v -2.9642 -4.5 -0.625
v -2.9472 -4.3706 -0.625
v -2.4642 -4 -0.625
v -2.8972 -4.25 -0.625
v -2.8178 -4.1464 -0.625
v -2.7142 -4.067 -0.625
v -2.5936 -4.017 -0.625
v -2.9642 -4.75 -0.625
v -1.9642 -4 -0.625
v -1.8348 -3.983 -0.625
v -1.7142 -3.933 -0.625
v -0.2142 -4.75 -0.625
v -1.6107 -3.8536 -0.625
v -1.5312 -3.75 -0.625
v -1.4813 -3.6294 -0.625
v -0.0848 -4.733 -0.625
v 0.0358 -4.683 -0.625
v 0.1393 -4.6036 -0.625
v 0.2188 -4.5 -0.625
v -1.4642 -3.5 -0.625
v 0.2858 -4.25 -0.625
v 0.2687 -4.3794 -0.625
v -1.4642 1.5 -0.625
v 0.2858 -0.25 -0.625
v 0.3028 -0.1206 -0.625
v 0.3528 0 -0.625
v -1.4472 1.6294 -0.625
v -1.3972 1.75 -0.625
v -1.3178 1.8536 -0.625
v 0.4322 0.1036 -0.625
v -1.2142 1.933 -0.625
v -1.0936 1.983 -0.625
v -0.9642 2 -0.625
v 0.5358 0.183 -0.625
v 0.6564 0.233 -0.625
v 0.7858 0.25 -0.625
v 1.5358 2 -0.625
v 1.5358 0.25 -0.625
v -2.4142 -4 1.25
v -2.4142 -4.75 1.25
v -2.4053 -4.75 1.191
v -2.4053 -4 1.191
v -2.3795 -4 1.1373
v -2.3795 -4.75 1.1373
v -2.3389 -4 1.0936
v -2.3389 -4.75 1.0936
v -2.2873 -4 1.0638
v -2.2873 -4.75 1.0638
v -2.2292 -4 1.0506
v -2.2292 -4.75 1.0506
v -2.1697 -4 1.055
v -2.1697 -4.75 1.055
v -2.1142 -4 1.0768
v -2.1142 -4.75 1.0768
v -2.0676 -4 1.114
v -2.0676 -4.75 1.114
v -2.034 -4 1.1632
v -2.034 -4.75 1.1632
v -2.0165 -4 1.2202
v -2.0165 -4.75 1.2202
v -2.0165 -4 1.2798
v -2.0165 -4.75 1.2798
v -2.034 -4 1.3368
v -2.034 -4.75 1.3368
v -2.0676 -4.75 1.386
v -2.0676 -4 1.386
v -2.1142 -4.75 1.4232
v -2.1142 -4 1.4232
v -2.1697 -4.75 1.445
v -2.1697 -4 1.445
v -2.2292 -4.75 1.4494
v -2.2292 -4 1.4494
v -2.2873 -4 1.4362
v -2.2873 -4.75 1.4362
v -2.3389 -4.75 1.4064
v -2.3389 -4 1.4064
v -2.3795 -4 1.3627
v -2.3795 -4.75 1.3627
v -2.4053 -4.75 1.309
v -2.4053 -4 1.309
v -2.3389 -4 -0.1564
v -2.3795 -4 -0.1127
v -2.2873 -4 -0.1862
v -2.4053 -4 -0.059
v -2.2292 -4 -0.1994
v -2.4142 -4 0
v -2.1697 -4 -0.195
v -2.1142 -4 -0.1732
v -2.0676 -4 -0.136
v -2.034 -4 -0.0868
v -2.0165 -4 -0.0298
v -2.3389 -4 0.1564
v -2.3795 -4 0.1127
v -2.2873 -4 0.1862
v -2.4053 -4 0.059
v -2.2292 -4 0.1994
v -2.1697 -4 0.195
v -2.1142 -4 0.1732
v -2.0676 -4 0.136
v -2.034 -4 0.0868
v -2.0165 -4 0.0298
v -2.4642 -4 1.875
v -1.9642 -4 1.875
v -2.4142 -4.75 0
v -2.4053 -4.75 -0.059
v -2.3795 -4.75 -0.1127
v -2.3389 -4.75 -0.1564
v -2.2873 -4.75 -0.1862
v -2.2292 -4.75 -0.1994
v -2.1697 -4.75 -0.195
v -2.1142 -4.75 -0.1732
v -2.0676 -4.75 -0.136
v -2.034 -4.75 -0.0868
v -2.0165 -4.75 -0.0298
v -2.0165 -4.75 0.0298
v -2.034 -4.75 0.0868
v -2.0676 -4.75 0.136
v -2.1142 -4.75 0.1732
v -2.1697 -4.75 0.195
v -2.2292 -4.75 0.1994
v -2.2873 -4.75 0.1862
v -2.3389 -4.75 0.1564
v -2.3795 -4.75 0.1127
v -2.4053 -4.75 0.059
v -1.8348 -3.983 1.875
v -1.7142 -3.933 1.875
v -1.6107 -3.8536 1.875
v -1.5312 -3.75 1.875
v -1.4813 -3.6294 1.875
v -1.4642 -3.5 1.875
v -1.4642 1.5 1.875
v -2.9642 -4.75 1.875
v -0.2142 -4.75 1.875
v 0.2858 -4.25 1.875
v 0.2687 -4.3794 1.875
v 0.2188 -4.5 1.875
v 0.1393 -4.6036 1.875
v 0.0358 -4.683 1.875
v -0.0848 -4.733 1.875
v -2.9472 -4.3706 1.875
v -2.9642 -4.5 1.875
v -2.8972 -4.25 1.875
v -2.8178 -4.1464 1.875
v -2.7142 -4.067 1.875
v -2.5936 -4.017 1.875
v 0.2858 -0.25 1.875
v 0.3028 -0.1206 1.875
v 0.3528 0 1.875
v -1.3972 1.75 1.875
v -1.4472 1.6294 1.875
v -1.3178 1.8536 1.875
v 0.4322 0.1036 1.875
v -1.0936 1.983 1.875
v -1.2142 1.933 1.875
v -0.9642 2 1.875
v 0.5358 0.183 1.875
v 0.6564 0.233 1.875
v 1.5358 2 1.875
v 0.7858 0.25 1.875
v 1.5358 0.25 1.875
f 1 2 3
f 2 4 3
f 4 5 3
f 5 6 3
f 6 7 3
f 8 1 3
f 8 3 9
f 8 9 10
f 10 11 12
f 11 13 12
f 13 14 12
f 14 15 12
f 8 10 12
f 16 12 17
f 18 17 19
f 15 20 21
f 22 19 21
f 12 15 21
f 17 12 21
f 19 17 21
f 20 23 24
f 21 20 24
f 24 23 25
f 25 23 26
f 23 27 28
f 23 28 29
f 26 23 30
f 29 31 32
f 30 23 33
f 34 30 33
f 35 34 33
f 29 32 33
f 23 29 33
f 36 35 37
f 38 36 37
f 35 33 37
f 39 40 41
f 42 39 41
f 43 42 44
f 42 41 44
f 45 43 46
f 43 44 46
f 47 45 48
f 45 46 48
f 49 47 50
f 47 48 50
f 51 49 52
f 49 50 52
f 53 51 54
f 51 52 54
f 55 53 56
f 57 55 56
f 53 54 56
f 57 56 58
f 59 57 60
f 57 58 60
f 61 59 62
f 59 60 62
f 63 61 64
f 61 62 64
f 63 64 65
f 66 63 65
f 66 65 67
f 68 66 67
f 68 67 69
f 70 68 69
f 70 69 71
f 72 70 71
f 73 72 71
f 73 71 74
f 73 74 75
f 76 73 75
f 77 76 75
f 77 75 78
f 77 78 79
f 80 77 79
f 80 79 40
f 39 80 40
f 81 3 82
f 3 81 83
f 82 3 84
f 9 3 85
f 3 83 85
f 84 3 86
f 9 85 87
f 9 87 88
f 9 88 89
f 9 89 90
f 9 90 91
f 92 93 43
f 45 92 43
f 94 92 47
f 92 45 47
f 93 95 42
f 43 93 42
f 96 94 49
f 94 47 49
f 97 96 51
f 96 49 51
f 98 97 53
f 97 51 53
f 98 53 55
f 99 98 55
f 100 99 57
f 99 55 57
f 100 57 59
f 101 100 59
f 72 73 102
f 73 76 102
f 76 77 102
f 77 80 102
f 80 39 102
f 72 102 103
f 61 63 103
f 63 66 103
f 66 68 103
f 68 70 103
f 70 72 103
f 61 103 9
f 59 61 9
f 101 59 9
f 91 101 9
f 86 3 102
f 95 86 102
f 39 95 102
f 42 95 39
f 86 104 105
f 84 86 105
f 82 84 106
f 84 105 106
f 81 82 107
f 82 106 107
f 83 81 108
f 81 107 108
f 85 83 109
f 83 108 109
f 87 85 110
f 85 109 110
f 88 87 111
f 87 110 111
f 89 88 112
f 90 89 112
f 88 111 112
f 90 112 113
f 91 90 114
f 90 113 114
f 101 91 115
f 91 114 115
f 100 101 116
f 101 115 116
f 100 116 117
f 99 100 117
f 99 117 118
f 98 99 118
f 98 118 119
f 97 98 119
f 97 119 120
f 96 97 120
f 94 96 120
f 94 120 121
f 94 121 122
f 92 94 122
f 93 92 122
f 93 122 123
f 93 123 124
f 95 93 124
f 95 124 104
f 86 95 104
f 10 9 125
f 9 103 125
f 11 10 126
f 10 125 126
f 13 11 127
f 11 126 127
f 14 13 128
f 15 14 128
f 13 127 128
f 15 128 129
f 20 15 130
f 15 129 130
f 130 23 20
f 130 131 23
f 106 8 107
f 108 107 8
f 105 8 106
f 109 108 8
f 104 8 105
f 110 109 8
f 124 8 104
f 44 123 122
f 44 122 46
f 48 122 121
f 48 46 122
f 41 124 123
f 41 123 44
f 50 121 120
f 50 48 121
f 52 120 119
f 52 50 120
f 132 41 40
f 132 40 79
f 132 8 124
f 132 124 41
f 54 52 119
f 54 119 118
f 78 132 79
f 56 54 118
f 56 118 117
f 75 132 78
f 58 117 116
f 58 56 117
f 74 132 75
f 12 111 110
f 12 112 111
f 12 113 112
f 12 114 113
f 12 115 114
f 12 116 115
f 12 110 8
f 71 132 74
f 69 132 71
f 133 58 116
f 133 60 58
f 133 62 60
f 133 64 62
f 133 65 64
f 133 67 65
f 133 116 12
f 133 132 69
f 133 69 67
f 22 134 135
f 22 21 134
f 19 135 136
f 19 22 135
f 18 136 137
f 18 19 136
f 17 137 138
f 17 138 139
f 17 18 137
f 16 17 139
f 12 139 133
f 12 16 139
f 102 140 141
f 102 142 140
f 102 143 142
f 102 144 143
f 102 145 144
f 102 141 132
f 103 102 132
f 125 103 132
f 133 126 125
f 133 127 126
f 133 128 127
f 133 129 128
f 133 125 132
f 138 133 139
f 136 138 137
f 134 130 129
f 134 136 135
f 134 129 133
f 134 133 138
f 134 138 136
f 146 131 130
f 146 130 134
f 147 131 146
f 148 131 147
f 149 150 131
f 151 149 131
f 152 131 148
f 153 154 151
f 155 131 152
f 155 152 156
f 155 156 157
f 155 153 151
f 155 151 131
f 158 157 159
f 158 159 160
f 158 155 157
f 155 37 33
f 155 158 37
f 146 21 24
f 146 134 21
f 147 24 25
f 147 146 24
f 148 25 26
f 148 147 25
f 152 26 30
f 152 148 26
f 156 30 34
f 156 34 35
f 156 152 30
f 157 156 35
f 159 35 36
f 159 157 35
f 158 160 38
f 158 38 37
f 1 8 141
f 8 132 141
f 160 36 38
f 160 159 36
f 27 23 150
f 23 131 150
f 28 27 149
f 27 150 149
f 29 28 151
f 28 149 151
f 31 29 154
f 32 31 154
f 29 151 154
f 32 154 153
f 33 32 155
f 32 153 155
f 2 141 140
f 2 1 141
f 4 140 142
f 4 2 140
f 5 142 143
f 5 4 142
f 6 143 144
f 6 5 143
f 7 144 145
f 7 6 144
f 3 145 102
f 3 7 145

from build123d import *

# Parameters (mm, degrees)
SKETCH1_W                  = 1.5
SKETCH1_H                  = 0.75
BOSS_EXTRUDE1_DEPTH        = 1.875
BOSS_EXTRUDE1_DEPTH_BACK   = 0.625
FILLET1_R                  = 0.5
F_0_4_0_4_DIAMETER_HOLE1_D = 0.4


with BuildPart() as part:
    # Sketch1 → Boss-Extrude1 (new body, two sides)
    with BuildSketch(Plane.XY) as boss_extrude1_sk:
        Polygon((0.285769435, 0.25), (-1.464230565, 0.25), (-1.464230565, -4), (-1.464230565, -4.75), (0.285769435, -4.75), align=None)
        Polygon((-1.464230565, 2), (-1.464230565, 0.25), (0.285769435, 0.25), (1.535769435, 0.25), (1.535769435, 2), align=None)
        with Locations((-2.214230565, -4.375)):
            Rectangle(SKETCH1_W, SKETCH1_H)
    extrude(amount=BOSS_EXTRUDE1_DEPTH)
    extrude(boss_extrude1_sk.sketch, amount=-BOSS_EXTRUDE1_DEPTH_BACK)

    # Fillet1
    fillet1_edges = [part.edges().sort_by_distance(p)[0] for p in [
        (0.285769435, 0.25, 0.625),
        (-2.964230565, -4, 0.625),
        (-1.464230565, -4, 0.625),
        (0.285769435, -4.75, 0.625),
        (-1.464230565, 2, 0.625),
    ]]
    fillet(fillet1_edges, radius=FILLET1_R)

    # Ø0.4 (0.4) Diameter Hole1 (through all)
    with Locations(Plane(origin=(0, -4, 0), x_dir=(1, 0, 0), z_dir=(0, 1, 0))):
        with Locations((-2.214230565, 0), (-2.214230565, -1.25)):
            Hole(F_0_4_0_4_DIAMETER_HOLE1_D / 2)


solid = part.part
